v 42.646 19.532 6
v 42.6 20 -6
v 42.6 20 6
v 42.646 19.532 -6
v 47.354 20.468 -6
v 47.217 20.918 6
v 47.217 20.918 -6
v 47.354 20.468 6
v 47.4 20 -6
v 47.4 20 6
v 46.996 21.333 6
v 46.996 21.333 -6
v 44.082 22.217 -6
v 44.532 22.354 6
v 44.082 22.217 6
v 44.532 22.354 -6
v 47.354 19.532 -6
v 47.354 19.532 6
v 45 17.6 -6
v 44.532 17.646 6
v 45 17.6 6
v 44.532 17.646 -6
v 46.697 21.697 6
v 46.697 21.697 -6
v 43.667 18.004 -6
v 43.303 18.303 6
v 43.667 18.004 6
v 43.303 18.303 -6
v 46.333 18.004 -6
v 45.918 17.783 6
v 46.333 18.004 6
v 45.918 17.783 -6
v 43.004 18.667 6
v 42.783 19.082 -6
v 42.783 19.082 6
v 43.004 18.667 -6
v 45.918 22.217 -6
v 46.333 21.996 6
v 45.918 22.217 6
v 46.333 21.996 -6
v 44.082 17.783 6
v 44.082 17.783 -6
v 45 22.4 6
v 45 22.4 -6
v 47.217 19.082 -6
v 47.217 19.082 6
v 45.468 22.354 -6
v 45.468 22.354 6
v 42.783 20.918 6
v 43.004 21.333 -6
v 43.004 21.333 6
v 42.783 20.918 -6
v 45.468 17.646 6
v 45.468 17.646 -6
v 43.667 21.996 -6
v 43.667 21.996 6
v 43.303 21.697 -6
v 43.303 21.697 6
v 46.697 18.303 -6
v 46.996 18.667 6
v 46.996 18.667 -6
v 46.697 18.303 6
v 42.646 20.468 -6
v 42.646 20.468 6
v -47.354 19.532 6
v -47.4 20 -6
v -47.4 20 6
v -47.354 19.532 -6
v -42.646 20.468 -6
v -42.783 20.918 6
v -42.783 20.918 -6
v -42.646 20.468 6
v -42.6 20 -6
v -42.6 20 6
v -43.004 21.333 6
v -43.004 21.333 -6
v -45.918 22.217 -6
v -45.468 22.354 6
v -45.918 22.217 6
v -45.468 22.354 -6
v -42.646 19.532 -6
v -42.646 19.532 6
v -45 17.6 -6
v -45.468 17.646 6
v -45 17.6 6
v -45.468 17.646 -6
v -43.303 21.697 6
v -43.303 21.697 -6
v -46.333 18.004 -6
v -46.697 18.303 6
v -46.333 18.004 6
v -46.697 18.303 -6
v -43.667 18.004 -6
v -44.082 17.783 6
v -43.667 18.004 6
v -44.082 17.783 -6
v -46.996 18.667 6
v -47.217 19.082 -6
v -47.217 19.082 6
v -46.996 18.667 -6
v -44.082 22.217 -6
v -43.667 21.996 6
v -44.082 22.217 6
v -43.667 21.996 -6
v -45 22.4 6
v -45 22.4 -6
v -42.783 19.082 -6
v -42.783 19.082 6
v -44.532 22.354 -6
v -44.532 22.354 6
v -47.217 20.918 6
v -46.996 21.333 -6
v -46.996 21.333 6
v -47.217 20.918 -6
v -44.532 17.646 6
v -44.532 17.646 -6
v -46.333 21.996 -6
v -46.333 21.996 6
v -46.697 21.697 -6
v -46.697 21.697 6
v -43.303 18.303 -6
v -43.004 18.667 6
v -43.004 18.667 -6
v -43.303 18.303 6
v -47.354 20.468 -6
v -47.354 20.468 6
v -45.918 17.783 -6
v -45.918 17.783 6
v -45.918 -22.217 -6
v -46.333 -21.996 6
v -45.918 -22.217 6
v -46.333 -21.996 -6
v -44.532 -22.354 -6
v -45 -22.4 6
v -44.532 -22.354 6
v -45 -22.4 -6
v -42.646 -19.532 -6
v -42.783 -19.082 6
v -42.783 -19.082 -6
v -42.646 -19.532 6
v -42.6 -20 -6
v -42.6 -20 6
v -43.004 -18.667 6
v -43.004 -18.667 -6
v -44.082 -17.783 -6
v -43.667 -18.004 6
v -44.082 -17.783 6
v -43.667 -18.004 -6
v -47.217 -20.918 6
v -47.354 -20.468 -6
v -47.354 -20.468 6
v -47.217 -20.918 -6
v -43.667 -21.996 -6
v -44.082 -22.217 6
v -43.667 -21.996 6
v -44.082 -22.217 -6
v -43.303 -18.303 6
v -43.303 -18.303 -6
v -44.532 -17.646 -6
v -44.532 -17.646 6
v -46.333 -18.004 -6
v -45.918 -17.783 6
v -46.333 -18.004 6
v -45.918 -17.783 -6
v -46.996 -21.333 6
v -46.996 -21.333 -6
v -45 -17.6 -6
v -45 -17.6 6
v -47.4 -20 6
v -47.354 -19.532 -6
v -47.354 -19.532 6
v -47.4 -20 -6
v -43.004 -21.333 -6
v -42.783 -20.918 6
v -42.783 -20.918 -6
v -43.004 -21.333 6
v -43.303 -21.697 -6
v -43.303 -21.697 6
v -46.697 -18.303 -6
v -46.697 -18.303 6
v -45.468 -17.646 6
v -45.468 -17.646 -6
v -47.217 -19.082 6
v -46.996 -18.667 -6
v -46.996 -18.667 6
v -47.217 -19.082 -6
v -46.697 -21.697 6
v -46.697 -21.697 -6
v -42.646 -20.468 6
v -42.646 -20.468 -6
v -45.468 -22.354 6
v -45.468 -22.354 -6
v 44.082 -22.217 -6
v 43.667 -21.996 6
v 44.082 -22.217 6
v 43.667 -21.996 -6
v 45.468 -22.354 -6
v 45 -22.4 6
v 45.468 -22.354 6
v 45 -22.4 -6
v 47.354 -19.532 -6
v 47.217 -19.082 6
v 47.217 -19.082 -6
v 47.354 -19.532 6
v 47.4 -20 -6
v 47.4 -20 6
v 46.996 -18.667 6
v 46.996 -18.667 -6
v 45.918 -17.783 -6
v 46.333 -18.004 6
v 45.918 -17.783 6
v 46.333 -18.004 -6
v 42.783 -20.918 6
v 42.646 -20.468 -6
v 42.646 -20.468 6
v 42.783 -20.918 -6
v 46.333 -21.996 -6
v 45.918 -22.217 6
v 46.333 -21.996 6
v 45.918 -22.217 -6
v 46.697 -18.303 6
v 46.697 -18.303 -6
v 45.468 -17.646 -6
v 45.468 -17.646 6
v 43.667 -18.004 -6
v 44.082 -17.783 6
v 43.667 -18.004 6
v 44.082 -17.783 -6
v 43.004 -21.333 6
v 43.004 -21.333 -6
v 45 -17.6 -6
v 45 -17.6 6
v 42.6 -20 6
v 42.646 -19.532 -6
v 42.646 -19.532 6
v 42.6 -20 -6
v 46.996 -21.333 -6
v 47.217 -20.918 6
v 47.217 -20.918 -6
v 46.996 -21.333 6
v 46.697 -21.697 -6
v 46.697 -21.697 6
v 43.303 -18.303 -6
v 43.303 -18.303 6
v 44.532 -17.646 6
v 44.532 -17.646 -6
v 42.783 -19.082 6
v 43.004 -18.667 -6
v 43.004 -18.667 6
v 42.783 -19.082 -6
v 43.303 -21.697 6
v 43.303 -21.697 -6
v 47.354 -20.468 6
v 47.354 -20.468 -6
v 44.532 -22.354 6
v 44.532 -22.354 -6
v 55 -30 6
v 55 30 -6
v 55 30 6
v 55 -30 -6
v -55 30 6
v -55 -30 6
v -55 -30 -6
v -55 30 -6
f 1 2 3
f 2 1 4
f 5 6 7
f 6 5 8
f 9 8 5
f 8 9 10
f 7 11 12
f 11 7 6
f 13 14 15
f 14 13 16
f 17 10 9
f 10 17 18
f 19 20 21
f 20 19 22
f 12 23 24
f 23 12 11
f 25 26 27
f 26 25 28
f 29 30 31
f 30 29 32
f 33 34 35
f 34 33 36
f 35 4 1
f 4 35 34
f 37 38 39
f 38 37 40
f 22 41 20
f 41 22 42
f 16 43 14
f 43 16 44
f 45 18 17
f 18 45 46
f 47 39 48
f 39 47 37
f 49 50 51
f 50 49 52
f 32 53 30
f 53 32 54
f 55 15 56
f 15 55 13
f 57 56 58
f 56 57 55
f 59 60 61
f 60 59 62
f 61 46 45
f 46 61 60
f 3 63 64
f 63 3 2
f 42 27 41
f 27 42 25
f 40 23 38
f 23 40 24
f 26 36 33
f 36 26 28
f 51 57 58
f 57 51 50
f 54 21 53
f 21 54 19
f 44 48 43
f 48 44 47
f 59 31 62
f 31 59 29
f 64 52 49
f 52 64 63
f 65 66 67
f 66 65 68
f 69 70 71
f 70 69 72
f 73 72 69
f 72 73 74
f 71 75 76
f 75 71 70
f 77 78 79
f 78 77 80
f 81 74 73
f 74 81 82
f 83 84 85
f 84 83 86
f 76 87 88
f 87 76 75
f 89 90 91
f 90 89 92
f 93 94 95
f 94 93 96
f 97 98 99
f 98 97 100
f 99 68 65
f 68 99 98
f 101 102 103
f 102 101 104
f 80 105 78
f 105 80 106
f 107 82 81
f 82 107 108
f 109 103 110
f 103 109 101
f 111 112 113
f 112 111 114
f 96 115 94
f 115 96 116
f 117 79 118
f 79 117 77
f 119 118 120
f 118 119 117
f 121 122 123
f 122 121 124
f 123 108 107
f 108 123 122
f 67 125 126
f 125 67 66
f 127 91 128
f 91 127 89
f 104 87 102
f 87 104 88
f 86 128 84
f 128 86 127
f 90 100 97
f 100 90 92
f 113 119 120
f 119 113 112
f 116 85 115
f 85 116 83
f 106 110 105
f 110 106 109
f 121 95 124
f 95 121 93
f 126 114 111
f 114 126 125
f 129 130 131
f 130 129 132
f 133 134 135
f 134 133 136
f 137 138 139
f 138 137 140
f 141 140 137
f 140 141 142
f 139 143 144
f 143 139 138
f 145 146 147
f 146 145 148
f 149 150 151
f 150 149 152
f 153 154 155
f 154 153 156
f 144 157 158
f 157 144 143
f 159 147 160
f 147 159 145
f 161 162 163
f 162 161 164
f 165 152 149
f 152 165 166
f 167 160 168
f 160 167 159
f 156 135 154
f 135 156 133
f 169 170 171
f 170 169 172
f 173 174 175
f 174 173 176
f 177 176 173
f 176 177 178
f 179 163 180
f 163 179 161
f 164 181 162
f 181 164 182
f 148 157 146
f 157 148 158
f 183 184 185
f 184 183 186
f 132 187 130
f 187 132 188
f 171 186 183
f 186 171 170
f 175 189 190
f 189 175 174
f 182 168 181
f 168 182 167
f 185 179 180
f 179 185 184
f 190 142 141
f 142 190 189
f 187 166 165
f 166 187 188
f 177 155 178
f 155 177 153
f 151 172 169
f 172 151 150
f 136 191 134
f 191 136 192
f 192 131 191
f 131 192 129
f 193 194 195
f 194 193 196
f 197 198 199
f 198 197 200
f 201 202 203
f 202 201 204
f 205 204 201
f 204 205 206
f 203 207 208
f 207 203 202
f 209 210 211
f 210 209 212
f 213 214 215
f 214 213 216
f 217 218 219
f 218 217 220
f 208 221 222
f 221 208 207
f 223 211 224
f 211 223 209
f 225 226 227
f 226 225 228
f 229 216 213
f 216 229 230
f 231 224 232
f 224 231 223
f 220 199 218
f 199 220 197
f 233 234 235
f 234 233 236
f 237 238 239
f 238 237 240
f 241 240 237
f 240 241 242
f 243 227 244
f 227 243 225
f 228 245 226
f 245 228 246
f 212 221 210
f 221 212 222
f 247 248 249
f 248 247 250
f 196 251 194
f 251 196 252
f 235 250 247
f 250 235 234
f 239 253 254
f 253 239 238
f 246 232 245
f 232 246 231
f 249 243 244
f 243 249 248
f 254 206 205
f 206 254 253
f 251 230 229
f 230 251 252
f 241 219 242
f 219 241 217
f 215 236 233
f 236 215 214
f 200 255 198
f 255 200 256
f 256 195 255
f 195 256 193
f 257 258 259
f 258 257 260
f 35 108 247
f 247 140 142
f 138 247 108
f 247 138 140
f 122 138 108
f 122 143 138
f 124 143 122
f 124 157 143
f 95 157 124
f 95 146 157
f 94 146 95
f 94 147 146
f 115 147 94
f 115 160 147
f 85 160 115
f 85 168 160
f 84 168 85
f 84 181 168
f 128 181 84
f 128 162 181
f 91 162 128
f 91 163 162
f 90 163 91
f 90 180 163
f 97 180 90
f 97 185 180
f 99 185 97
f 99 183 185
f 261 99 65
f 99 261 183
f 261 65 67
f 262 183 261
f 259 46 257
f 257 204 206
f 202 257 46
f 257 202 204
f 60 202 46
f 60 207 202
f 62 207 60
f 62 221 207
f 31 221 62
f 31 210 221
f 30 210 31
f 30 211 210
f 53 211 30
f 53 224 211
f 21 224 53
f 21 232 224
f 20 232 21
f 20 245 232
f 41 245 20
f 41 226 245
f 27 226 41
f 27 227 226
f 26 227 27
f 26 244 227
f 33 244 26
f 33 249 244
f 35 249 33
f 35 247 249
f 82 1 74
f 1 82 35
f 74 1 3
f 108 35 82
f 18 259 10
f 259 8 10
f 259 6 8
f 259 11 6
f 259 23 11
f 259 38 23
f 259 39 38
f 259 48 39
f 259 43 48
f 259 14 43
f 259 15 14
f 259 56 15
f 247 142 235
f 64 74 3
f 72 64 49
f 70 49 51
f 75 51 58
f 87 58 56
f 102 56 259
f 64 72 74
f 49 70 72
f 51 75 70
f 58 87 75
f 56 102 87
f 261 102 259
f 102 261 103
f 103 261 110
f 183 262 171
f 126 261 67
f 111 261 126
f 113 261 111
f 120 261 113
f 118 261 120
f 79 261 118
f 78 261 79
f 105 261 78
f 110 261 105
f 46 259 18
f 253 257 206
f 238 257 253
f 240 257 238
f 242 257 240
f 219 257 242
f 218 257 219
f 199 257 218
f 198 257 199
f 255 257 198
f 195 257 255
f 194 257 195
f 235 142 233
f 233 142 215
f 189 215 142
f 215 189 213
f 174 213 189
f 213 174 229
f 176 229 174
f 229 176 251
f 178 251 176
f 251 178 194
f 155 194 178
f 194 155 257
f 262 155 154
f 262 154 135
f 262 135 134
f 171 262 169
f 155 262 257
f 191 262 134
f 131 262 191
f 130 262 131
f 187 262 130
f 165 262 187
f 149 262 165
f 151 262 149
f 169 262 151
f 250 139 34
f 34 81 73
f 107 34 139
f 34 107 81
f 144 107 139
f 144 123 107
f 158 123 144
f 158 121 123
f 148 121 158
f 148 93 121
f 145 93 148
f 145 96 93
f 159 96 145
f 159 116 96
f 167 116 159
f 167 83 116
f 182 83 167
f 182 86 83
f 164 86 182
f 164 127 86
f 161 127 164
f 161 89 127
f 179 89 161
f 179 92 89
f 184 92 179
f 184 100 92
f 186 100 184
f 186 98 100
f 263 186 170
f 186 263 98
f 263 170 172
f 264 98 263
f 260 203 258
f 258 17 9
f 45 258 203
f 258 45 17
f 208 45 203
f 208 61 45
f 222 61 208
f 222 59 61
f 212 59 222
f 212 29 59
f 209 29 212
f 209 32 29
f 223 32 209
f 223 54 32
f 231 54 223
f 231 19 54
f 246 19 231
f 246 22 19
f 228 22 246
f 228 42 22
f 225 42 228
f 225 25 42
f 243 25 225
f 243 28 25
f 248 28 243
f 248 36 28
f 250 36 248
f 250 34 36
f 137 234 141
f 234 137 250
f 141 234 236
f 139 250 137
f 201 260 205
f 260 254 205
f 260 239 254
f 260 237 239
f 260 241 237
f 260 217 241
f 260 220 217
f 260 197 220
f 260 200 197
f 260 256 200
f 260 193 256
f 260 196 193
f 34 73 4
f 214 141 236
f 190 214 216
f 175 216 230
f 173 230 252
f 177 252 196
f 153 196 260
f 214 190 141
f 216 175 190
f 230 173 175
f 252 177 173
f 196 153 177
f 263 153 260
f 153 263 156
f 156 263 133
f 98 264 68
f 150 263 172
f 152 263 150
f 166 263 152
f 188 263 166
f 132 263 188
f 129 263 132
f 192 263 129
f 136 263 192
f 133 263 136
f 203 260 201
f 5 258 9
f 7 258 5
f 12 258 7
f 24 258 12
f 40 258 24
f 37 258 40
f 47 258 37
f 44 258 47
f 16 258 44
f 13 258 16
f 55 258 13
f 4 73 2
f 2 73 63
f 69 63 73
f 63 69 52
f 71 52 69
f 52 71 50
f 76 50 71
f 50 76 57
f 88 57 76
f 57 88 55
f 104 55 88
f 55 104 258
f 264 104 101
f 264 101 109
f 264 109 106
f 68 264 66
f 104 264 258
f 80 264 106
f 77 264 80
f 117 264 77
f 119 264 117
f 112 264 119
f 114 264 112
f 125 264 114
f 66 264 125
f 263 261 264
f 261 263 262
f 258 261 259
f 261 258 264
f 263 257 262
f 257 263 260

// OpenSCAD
$fn = 32;

// ----------------------------------------------------------------------
// Corner plate 110 x 60 x 12
// 4 holes, centres taken from the edge offset
// ----------------------------------------------------------------------

// --- parameters (mm) ---
plate = [110, 60, 12];  // overall size (x, y, z)
holes = 4;              // number of holes the drawing asks for
bore_d = 4.5;           // nominal hole diameter from the drawing
print_allowance = 0.3;  // clearance added for printing
edge = 10;              // hole centre offset from the plate edge

// --- derived feature positions (mm) ---
hole_d = bore_d + print_allowance;  // = 4.8   hole diameter as printed
corner_x = plate[0] / 2 - edge;     // = 45   corner hole X
corner_y = plate[1] / 2 - edge;     // = 20   corner hole Y
feature_centers = [
  [corner_x, corner_y],
  [-corner_x, corner_y],
  [-corner_x, -corner_y],
  [corner_x, -corner_y]
];   // hole centres the loop below drills

// plate outline, every hole drilled through with the same cutters
difference() {
  cube(plate, center = true);
  for (centre = feature_centers)
    translate([centre[0], centre[1], 0])
      cylinder(d = hole_d, h = plate[2] + 2, center = true);
}
